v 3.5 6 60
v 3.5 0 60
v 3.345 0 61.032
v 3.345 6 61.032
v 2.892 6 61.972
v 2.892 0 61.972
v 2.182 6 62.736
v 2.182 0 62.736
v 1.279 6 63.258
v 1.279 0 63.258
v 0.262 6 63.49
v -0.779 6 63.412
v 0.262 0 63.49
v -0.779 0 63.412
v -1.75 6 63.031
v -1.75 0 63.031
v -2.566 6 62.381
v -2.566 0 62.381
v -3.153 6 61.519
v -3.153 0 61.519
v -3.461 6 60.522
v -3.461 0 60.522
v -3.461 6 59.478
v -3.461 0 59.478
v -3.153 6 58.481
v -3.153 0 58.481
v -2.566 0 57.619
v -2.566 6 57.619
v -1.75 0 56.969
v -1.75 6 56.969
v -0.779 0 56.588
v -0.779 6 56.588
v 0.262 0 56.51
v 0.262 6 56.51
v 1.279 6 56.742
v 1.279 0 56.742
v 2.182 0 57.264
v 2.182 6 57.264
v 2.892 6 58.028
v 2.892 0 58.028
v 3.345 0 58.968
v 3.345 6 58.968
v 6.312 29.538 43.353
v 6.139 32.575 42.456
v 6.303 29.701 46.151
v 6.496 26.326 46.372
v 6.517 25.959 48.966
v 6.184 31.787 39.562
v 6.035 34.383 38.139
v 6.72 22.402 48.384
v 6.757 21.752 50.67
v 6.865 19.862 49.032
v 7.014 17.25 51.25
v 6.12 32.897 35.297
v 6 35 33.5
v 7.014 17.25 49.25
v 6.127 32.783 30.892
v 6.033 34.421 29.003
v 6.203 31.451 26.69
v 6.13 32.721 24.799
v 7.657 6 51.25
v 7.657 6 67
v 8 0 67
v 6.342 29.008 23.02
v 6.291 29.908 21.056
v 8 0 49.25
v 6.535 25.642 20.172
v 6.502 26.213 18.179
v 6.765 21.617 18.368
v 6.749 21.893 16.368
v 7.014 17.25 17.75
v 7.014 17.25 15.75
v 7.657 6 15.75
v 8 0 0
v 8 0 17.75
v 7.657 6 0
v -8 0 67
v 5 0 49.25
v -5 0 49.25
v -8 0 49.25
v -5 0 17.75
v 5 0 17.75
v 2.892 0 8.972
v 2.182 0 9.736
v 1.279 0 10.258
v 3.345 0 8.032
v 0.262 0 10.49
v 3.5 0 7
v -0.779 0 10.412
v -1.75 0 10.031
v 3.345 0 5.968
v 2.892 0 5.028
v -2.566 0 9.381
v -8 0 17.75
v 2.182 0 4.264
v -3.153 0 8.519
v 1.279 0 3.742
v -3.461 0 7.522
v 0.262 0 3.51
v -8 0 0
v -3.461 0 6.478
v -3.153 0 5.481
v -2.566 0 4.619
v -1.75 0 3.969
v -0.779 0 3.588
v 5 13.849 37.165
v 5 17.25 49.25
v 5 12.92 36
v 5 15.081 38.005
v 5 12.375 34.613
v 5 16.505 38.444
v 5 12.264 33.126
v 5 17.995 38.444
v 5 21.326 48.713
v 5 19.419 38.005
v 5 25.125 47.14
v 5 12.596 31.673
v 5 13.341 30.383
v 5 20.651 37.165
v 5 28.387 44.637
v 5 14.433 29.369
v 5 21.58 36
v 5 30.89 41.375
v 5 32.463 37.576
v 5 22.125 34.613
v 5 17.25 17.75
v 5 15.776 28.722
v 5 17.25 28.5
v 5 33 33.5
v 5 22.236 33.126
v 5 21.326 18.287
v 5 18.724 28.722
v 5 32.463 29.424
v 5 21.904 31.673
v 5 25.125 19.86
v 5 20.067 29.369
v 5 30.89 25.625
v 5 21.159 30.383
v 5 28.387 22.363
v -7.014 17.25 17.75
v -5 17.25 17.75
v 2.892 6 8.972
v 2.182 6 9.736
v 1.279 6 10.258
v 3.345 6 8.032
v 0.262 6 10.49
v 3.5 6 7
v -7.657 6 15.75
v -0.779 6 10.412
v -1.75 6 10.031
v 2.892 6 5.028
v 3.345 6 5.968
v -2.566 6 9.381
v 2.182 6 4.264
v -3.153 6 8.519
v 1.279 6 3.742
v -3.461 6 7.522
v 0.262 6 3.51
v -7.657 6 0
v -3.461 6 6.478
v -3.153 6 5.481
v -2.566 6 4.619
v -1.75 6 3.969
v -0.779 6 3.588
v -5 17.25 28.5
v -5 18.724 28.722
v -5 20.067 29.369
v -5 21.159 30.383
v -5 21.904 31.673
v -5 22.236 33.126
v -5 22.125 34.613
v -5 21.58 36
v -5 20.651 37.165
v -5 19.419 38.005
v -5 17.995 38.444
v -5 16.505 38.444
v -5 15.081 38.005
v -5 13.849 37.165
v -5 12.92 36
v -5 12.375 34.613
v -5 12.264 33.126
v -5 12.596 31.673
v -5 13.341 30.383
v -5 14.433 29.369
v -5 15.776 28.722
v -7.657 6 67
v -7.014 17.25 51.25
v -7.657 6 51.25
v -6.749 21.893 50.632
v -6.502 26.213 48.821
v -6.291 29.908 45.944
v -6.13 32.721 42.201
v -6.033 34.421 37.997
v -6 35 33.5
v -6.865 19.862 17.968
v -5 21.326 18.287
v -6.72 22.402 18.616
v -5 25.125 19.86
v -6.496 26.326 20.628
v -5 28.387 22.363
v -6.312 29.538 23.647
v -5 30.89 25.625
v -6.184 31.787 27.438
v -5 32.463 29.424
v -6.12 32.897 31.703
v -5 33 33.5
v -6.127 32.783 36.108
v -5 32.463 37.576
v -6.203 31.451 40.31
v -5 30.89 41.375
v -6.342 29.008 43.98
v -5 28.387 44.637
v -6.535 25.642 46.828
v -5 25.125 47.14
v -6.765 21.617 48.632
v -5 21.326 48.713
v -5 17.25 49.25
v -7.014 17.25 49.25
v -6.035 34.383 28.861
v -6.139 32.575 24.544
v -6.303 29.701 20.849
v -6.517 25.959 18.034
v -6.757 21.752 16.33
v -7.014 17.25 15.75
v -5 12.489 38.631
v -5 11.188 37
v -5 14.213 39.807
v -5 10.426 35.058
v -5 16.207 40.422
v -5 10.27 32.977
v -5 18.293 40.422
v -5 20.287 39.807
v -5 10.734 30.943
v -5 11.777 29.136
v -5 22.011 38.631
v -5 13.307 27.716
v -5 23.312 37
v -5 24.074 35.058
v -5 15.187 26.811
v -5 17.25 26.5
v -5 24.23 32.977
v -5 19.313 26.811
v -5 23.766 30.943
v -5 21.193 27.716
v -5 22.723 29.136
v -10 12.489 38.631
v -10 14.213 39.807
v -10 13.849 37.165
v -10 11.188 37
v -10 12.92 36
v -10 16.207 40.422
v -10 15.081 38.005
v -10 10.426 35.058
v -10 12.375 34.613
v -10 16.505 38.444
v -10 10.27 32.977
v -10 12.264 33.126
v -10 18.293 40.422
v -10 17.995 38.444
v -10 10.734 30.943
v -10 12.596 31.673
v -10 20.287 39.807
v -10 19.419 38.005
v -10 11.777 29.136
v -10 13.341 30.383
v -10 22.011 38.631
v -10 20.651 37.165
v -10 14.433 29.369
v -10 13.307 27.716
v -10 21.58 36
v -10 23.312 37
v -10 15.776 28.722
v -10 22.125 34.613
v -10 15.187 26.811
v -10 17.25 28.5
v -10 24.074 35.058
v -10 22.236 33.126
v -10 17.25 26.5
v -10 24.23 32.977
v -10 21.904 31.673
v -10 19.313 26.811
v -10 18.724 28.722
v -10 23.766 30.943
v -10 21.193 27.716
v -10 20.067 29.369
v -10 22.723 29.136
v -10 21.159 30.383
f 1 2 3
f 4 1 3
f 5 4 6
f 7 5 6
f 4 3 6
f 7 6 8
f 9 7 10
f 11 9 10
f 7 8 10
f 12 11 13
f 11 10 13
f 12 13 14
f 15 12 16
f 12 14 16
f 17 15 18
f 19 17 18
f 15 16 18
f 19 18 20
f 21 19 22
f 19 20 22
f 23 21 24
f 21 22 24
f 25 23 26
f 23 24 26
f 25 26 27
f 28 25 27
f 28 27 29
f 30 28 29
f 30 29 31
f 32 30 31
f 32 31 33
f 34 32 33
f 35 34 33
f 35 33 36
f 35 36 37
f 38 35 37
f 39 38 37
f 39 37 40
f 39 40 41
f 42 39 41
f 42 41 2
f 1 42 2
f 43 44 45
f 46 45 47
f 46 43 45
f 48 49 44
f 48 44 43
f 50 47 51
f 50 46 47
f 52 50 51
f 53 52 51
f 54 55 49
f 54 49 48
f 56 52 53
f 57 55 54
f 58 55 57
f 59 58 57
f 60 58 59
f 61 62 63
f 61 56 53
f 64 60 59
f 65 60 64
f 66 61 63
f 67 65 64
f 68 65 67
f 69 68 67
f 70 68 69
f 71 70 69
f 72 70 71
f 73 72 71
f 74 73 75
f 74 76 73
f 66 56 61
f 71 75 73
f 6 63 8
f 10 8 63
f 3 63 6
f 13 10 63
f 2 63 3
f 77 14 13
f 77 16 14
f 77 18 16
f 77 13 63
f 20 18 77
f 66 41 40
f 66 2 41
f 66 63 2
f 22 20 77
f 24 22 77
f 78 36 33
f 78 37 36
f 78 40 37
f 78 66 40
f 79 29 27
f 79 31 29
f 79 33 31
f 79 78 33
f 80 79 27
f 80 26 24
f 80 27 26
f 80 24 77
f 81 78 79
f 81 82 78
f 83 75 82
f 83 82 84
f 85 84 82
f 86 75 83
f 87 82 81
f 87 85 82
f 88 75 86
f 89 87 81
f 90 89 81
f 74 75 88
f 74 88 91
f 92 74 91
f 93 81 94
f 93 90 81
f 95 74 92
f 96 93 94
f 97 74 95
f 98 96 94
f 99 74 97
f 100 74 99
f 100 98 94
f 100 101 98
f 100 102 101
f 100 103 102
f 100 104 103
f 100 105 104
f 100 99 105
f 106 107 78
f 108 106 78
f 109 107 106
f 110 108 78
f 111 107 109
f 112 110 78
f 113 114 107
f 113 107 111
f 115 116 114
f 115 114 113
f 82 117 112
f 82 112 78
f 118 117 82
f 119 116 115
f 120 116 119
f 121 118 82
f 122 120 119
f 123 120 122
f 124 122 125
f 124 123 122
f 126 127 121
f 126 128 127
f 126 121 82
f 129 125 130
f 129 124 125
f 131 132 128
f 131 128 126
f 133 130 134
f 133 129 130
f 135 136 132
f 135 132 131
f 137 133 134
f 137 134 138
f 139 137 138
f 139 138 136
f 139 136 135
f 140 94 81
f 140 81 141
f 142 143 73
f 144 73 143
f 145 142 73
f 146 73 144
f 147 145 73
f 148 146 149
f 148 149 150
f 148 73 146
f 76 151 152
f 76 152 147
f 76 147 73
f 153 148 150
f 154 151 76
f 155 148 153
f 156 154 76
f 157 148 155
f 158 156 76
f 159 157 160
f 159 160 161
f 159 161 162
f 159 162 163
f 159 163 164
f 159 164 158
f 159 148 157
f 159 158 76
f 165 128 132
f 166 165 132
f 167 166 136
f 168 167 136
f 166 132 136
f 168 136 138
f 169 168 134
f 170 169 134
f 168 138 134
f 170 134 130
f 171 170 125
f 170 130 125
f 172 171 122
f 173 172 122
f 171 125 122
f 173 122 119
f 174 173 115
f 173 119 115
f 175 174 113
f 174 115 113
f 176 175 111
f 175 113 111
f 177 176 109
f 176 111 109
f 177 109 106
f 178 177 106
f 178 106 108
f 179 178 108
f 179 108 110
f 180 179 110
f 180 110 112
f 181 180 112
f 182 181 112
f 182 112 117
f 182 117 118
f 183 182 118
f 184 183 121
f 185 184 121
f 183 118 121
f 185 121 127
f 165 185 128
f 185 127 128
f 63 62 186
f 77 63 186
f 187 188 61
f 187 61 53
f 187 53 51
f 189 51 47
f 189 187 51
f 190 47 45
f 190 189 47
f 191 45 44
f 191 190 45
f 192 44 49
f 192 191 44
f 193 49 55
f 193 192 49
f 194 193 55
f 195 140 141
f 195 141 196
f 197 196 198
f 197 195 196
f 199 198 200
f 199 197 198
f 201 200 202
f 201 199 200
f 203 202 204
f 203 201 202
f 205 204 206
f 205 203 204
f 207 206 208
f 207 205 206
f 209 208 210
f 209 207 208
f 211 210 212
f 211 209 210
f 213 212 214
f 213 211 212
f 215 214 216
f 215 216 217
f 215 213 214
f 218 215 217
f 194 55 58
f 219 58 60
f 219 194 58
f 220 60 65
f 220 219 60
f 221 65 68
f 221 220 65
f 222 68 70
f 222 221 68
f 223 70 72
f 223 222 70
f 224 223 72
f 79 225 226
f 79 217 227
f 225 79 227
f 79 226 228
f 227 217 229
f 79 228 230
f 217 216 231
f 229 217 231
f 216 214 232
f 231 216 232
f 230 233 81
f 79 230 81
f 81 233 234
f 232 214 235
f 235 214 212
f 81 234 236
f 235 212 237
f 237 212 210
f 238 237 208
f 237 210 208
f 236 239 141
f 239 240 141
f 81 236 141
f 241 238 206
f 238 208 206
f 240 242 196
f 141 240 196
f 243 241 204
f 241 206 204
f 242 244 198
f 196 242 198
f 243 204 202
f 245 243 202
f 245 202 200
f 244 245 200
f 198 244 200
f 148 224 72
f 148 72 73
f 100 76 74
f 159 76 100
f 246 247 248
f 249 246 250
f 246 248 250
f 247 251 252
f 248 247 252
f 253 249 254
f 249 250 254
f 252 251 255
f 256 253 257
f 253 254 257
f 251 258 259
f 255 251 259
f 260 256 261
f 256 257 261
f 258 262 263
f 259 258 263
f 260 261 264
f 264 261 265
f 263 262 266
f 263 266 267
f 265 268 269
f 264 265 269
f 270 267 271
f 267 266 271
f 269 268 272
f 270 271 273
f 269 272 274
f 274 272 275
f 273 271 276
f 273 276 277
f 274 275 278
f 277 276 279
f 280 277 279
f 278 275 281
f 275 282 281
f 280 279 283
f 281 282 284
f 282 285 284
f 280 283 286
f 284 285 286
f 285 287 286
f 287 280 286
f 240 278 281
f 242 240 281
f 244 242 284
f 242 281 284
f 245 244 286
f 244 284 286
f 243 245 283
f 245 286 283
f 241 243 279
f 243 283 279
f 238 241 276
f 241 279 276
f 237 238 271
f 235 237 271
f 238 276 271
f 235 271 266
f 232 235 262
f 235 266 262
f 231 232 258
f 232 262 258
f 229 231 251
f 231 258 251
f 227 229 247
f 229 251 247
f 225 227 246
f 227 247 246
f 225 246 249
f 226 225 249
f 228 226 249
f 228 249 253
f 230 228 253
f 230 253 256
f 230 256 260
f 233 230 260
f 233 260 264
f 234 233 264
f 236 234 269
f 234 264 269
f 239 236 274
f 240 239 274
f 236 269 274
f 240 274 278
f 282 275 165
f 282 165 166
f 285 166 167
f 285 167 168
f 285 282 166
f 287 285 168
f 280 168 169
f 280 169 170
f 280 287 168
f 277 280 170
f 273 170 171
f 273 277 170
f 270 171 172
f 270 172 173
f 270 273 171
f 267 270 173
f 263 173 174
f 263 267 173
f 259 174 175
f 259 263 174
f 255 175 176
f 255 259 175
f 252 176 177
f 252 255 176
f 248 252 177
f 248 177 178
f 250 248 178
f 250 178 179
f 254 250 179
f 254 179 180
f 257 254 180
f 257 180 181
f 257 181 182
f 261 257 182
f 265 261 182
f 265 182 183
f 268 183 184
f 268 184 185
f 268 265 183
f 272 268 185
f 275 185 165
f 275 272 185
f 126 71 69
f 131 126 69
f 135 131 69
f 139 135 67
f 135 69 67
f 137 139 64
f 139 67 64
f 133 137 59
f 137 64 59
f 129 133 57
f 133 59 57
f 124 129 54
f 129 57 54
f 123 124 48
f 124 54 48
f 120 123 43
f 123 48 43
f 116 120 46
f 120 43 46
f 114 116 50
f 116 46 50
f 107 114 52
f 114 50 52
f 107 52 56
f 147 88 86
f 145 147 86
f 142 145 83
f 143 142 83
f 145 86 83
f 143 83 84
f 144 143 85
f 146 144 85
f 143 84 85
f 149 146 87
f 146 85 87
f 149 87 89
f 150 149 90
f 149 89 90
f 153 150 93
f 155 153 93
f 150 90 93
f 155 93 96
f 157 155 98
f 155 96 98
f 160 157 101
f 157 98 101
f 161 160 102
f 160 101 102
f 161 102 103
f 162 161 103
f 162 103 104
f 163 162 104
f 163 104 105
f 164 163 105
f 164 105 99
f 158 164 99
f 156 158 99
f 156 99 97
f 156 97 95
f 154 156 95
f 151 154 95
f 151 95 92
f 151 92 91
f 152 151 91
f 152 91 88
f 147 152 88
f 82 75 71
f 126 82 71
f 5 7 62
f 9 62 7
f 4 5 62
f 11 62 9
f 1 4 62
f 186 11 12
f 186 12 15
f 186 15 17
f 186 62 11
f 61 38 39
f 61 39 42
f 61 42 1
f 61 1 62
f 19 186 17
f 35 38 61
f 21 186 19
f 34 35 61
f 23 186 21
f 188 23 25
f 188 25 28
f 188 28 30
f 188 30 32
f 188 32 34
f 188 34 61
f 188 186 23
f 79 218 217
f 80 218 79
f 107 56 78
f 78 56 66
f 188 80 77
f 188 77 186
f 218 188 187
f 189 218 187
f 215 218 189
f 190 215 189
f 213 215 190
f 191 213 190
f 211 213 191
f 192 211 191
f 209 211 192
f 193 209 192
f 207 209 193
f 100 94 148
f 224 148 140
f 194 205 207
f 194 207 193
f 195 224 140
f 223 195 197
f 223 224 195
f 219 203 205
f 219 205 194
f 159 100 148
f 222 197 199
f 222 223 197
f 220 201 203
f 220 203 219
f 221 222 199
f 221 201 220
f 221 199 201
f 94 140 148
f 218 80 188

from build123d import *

# Parameters (mm, degrees)
EXTRUDE_1_DEPTH     = 67
SKETCH_2_R          = 5
CUT_EXTRUDE_1_DEPTH = 15
CUT_EXTRUDE_2_DEPTH = 3
SKETCH_4_R          = 7
SKETCH_4_R_2        = 5
EXTRUDE_2_DEPTH     = 5
SKETCH_5_R          = 3.5
CUT_EXTRUDE_4_DEPTH = 10


with BuildPart() as part:
    # 草图1 → 凸台-拉伸1 (new body)
    with BuildSketch(Plane.XY):
        Polygon((8, 0), (-8, 0), (-6, 35), (6, 35), align=None)
    extrude(amount=EXTRUDE_1_DEPTH)

    # 草图2 → 切除-拉伸1 (cut, symmetric)
    with BuildSketch(Plane(origin=(0, 0, 0), x_dir=(0, 0, -1), z_dir=(1, 0, 0))):
        with BuildLine():
            Line((-67, 35), (-67, 6))
            Line((-67, 6), (-51.25, 6))
            Line((-51.25, 6), (-51.25, 17.25))
            ThreePointArc((-51.25, 17.25), (-46.051145366, 29.801145366), (-33.5, 35))
            Line((-33.5, 35), (-67, 35))
        make_face()
        with BuildLine():
            Line((0, 35), (-33.5, 35))
            ThreePointArc((-33.5, 35), (-20.948854634, 29.801145366), (-15.75, 17.25))
            Line((-15.75, 17.25), (-15.75, 6))
            Line((-15.75, 6), (0, 6))
            Line((0, 6), (0, 35))
        make_face()
        with Locations((-33.5, 17.25)):
            Circle(SKETCH_2_R)
    extrude(amount=CUT_EXTRUDE_1_DEPTH, both=True, mode=Mode.SUBTRACT)

    # 草图3 → 切除-拉伸2 (cut)
    with BuildSketch(Plane(origin=(8, 0, 0), x_dir=(0, 0, -1), z_dir=(1, 0, 0))):
        with BuildLine():
            Line((-49.25, 6), (-49.25, 0))
            Line((-49.25, 0), (-17.75, 0))
            Line((-17.75, 0), (-17.75, 6))
            Line((-17.75, 6), (-17.75, 17.25))
            ThreePointArc((-17.75, 17.25), (-33.5, 33), (-49.25, 17.25))
            Line((-49.25, 17.25), (-49.25, 6))
        make_face()
    cut_extrude_2 = extrude(amount=-CUT_EXTRUDE_2_DEPTH, mode=Mode.SUBTRACT)

    # 镜向1: 切除-拉伸2 across plane
    add(cut_extrude_2.mirror(Plane(origin=(0, 0, 0), x_dir=(0, 0, 1), z_dir=(1, 0, 0))), mode=Mode.SUBTRACT)

    # 草图4 → 凸台-拉伸2 (add)
    with BuildSketch(Plane(origin=(-10, 0, 0), x_dir=(0, 0, -1), z_dir=(1, 0, 0))):
        with Locations((-33.5, 17.25)):
            Circle(SKETCH_4_R)
        with Locations((-33.5, 17.25)):
            Circle(SKETCH_4_R_2, mode=Mode.SUBTRACT)
    extrude(amount=EXTRUDE_2_DEPTH)

    # 草图5 → 切除-拉伸4 (cut)
    with BuildSketch(Plane.XZ):
        with Locations((0, 60)):
            Circle(SKETCH_5_R)
        with Locations((0, 7)):
            Circle(SKETCH_5_R)
    extrude(amount=-CUT_EXTRUDE_4_DEPTH, mode=Mode.SUBTRACT)


solid = part.part
